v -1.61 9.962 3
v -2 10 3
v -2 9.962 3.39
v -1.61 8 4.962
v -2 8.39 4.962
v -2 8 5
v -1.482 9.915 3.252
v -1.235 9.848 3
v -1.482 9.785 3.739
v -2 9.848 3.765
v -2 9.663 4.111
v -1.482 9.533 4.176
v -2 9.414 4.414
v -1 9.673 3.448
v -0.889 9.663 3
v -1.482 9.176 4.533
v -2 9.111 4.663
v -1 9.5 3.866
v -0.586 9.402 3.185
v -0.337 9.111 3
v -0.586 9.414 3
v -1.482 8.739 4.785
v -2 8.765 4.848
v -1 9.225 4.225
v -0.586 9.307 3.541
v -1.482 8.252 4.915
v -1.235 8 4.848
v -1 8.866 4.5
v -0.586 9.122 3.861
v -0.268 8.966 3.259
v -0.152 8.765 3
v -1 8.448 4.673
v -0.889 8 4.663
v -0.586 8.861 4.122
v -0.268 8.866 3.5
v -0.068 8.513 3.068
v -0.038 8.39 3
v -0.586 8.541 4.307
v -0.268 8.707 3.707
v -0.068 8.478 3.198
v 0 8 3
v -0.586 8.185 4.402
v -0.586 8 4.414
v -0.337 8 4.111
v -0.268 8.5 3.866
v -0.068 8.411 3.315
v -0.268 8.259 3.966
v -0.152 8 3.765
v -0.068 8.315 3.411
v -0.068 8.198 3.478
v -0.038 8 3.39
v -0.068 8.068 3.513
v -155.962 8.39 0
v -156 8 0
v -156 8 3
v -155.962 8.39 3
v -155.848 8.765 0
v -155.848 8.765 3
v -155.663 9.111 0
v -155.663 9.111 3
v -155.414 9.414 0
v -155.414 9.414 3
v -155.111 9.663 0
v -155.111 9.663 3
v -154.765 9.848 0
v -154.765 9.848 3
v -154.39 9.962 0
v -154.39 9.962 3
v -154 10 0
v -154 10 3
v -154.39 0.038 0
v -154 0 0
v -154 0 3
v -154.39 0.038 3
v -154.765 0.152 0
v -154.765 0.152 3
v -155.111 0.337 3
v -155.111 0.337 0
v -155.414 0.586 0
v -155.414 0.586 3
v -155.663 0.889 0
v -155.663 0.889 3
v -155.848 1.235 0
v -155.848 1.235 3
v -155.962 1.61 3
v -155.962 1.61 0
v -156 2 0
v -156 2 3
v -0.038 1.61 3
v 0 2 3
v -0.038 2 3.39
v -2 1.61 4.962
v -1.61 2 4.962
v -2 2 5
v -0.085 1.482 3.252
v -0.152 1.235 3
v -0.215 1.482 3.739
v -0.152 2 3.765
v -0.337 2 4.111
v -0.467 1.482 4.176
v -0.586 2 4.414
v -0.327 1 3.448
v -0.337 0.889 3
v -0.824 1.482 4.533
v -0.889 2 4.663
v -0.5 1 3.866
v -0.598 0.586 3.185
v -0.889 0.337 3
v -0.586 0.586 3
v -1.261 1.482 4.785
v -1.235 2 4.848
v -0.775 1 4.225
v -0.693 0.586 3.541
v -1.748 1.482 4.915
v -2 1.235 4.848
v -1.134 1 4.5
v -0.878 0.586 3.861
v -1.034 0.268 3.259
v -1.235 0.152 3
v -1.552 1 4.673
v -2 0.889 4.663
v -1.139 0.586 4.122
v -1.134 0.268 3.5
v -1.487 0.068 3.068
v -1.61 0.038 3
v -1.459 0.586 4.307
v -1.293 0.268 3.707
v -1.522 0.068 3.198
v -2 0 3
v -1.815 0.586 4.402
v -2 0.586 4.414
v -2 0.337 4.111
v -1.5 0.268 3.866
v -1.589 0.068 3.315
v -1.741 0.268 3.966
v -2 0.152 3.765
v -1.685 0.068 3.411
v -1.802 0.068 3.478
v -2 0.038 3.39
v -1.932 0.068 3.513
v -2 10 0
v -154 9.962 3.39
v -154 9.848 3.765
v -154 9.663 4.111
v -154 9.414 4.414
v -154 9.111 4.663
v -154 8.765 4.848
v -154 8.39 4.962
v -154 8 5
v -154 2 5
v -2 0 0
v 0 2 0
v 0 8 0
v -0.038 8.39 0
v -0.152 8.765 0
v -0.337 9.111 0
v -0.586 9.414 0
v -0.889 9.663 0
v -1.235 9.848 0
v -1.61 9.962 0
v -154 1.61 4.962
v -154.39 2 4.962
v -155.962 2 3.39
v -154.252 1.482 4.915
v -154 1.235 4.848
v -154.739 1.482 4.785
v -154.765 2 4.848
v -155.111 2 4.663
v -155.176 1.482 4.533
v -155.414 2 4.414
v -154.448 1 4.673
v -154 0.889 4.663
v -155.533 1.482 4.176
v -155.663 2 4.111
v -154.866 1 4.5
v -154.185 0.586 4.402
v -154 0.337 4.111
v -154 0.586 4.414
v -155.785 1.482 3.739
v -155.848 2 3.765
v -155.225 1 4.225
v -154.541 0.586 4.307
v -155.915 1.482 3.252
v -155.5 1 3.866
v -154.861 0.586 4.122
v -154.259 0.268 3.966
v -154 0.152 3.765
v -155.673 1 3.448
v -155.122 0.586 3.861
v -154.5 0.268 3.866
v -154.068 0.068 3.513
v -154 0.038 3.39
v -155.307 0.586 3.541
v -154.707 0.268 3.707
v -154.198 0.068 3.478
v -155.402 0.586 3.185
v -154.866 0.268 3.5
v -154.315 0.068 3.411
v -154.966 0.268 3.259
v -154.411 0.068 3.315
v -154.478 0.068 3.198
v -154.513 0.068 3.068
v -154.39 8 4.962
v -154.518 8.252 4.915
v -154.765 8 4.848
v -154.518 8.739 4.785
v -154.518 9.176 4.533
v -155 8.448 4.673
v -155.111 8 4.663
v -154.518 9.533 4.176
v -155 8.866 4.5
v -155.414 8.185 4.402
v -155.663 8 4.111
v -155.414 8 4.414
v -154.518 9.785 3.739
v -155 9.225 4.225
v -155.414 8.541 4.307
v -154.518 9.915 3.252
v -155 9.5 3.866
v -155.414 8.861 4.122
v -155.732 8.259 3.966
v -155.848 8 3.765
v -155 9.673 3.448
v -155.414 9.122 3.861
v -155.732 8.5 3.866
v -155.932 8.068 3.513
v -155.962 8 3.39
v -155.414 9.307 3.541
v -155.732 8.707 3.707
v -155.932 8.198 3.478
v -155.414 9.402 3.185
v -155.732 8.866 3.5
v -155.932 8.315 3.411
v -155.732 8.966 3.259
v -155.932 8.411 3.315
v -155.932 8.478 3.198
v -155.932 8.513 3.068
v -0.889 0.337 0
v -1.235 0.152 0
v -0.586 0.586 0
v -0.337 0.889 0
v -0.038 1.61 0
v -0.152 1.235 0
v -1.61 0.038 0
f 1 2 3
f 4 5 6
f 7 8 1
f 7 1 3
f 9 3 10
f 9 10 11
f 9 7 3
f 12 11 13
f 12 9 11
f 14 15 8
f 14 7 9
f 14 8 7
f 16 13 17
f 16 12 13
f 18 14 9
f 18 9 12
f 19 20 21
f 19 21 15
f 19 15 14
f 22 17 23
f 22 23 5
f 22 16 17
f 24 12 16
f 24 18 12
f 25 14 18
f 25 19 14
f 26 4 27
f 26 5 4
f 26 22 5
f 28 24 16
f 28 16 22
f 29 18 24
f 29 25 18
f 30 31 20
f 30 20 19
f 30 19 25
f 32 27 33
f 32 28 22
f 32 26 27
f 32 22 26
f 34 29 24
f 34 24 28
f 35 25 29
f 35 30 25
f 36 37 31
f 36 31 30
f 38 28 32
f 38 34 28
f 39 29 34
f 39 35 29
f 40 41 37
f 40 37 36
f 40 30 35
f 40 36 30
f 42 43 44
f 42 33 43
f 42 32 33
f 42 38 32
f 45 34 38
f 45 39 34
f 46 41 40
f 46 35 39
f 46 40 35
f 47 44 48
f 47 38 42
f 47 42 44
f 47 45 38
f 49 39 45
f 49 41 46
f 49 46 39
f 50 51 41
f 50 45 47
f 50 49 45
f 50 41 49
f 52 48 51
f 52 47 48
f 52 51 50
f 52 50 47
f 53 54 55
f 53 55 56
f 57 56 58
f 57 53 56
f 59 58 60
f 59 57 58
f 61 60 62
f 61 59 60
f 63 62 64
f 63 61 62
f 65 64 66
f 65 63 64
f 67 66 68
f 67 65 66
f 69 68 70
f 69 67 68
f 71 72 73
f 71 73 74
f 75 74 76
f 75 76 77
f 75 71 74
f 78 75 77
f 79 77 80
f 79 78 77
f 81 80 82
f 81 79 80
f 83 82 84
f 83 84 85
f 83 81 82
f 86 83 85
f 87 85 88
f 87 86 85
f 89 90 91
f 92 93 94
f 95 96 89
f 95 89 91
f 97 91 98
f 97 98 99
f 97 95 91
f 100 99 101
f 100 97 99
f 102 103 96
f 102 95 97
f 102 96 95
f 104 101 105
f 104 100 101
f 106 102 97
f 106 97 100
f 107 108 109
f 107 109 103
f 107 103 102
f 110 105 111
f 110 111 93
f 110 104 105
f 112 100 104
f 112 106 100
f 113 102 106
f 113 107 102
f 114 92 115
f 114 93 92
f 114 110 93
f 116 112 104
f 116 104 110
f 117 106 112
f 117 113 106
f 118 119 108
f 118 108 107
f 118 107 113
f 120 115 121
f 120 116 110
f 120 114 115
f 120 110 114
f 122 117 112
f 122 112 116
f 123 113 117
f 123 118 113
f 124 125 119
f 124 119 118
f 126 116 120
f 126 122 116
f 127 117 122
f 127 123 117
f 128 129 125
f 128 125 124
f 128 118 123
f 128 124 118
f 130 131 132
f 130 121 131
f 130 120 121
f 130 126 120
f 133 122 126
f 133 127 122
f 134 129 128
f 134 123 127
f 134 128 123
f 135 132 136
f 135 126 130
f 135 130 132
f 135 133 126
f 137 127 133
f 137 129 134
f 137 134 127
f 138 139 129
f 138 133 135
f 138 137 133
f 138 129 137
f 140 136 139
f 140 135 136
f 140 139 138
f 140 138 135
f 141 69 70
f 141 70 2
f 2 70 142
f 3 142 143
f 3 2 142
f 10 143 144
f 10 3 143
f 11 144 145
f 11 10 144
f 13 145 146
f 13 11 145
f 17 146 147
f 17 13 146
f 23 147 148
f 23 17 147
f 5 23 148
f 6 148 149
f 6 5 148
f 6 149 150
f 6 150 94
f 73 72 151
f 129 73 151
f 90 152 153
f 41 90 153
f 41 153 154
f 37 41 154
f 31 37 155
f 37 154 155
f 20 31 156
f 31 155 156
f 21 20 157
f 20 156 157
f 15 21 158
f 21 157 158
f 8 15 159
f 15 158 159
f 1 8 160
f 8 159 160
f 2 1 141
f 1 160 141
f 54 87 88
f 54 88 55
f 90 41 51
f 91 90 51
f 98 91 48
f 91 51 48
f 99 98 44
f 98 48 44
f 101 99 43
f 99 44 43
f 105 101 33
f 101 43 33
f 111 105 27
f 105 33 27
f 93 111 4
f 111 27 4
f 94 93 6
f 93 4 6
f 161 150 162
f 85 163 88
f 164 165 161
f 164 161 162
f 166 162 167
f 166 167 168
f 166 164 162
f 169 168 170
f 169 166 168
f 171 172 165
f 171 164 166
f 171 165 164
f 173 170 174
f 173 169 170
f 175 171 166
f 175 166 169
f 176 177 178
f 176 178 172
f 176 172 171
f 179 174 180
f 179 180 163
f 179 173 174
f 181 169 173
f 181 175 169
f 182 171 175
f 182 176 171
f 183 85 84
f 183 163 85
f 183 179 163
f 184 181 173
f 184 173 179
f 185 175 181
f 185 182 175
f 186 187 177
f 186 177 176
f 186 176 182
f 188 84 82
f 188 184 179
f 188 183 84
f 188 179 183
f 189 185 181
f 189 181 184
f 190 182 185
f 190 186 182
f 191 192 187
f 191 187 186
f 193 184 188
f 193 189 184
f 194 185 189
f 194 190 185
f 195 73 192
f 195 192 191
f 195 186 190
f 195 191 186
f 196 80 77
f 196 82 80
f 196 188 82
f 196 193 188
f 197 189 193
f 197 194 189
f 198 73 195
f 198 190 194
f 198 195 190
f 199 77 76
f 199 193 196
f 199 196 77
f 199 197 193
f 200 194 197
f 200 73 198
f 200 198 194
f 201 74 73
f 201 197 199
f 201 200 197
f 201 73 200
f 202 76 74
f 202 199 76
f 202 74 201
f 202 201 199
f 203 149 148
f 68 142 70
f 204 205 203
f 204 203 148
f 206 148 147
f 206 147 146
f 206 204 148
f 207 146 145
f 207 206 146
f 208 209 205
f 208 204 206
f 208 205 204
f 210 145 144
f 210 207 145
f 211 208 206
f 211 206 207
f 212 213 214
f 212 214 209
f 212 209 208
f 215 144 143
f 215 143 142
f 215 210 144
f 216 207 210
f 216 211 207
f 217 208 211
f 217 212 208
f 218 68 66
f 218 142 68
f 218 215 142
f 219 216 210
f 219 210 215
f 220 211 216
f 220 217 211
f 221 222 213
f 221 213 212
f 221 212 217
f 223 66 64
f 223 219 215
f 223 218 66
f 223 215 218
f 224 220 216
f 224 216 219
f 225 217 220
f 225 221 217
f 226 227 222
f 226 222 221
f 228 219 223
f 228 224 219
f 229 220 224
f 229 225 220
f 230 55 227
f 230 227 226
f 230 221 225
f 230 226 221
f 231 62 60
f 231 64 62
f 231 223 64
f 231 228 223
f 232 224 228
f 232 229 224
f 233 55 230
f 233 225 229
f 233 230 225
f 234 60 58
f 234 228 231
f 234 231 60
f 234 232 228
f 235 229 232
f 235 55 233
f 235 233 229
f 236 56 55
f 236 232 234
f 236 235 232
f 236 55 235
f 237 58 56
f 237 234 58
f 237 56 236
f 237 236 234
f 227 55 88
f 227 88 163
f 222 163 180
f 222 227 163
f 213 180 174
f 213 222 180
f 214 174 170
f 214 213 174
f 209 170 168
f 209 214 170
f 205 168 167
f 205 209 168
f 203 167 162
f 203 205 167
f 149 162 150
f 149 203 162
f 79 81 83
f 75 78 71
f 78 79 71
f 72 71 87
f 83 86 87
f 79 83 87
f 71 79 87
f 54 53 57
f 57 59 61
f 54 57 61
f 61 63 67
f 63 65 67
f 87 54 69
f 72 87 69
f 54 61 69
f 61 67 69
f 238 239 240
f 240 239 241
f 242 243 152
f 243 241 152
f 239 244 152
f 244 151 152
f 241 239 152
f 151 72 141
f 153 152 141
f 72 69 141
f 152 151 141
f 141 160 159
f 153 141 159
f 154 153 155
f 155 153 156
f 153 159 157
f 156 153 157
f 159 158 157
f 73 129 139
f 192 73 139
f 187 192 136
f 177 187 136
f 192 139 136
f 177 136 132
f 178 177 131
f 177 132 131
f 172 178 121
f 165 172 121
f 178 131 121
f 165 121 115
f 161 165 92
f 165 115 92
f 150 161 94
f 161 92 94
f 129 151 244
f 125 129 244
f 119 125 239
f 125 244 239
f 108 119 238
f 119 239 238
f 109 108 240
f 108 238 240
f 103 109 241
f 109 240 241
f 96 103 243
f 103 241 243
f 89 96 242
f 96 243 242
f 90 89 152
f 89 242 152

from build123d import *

# Parameters (mm, degrees)
F0_W         = 156
F0_H         = 10
F1_DEPTH     = 5
F2_R         = 2
F3_T1_DEPTH  = 8
F3_S5_W      = 2
F3_S5_H      = 2
F3_T6_DEPTH  = 2
F3_S11_W     = 2
F3_S11_H     = 2
F3_T12_DEPTH = 2
F3_S17_W     = 2
F3_S17_H     = 2
F3_T18_DEPTH = 2
F3_S23_W     = 2
F3_S23_H     = 2
F3_T24_DEPTH = 2


# Not quite as in the source:
# - a fillet or chamfer that OpenCascade refuses, or shapes differently, is made with other operations: its cross-section is extruded or revolved along the edge and cut away or added


with BuildPart() as f1:
    # F0 (on Top) → F1 (new body)
    with BuildSketch(Plane.XY):
        with Locations((-78, 5)):
            Rectangle(F0_W, F0_H)
    extrude(amount=F1_DEPTH)

    # F2
    f2_edges = [f1.edges().sort_by_distance(p)[0] for p in [
        (-78, 10, 5),
        (-156, 5, 5),
        (-78, 0, 5),
        (0, 5, 5),
    ]]
    fillet(f2_edges, radius=F2_R)

    # F3: fillet of radius 2 on 4 edges, made by hand

    # F3_s2 → F3_t1 (cut)
    with BuildSketch(Plane.XY.offset(-5)):
        with BuildLine():
            ThreePointArc((0, 8), (-0.5857864376, 9.4142135624), (-2, 10))
            Line((-2, 10), (0, 10))
            Line((0, 10), (0, 8))
        make_face()
        with BuildLine():
            ThreePointArc((-2, 0), (-0.5857864376, 0.5857864376), (0, 2))
            Line((0, 2), (0, 0))
            Line((0, 0), (-2, 0))
        make_face()
        with BuildLine():
            ThreePointArc((-154, 0), (-155.4142135624, 0.5857864376), (-156, 2))
            Line((-156, 2), (-156, 0))
            Line((-156, 0), (-154, 0))
        make_face()
        with BuildLine():
            ThreePointArc((-156, 8), (-155.4142135624, 9.4142135624), (-154, 10))
            Line((-154, 10), (-156, 10))
            Line((-156, 10), (-156, 8))
        make_face()
    extrude(amount=F3_T1_DEPTH, mode=Mode.SUBTRACT)


with BuildPart() as f3_tool4:
    # F3_s5 → F3_t6 (new body)
    with BuildSketch(Plane.YZ.offset(-154)):
        with Locations((9, 4)):
            Rectangle(F3_S5_W, F3_S5_H)
    extrude(amount=-F3_T6_DEPTH)

    # F3_s7 → F3_t8 (revolve, cut)
    with BuildSketch(Plane(origin=(-154, 8, 3), x_dir=(0, -0.7071067812, -0.7071067812), z_dir=(0, 0.7071067812, -0.7071067812))):
        with BuildLine():
            ThreePointArc((0, -2), (2, 0), (0, 2))
            Line((0, 2), (0, -2))
        make_face()
    revolve(axis=Axis((-154, 8, 3), (-1, 0, 0)), mode=Mode.SUBTRACT)


with BuildPart() as f1_1:
    add(f1.part)

    # F3_t3: cut F3_tool4
    add(f3_tool4.part, mode=Mode.SUBTRACT)


with BuildPart() as f3_tool10:
    # F3_s11 → F3_t12 (new body)
    with BuildSketch(Plane.XZ.offset(-2)):
        with Locations((-155, 4)):
            Rectangle(F3_S11_W, F3_S11_H)
    extrude(amount=F3_T12_DEPTH)

    # F3_s13 → F3_t14 (revolve, cut)
    with BuildSketch(Plane(origin=(-154, 2, 3), x_dir=(0.7071067812, 0, -0.7071067812), z_dir=(-0.7071067812, 0, -0.7071067812))):
        with BuildLine():
            ThreePointArc((0, -2), (2, 0), (0, 2))
            Line((0, 2), (0, -2))
        make_face()
    revolve(axis=Axis((-154, 2, 3), (0, -1, 0)), mode=Mode.SUBTRACT)


with BuildPart() as f1_2:
    add(f1_1.part)

    # F3_t9: cut F3_tool10
    add(f3_tool10.part, mode=Mode.SUBTRACT)


with BuildPart() as f3_tool16:
    # F3_s17 → F3_t18 (new body)
    with BuildSketch(Plane.XZ.offset(-2)):
        with Locations((-1, 4)):
            Rectangle(F3_S17_W, F3_S17_H)
    extrude(amount=F3_T18_DEPTH)

    # F3_s19 → F3_t20 (revolve, cut)
    with BuildSketch(Plane(origin=(-2, 2, 3), x_dir=(-0.7071067812, 0, -0.7071067812), z_dir=(-0.7071067812, 0, 0.7071067812))):
        with BuildLine():
            ThreePointArc((0, -2), (2, 0), (0, 2))
            Line((0, 2), (0, -2))
        make_face()
    revolve(axis=Axis((-2, 2, 3), (0, -1, 0)), mode=Mode.SUBTRACT)


with BuildPart() as f1_3:
    add(f1_2.part)

    # F3_t15: cut F3_tool16
    add(f3_tool16.part, mode=Mode.SUBTRACT)


with BuildPart() as f3_tool22:
    # F3_s23 → F3_t24 (new body)
    with BuildSketch(Plane.YZ.offset(-2)):
        with Locations((9, 4)):
            Rectangle(F3_S23_W, F3_S23_H)
    extrude(amount=F3_T24_DEPTH)

    # F3_s25 → F3_t26 (revolve, cut)
    with BuildSketch(Plane(origin=(-2, 8, 3), x_dir=(0, -0.7071067812, -0.7071067812), z_dir=(0, -0.7071067812, 0.7071067812))):
        with BuildLine():
            ThreePointArc((0, -2), (2, 0), (0, 2))
            Line((0, 2), (0, -2))
        make_face()
    revolve(axis=Axis((-2, 8, 3), (1, 0, 0)), mode=Mode.SUBTRACT)


with BuildPart() as f1_4:
    add(f1_3.part)

    # F3_t21: cut F3_tool22
    add(f3_tool22.part, mode=Mode.SUBTRACT)


solid = f1_4.part
